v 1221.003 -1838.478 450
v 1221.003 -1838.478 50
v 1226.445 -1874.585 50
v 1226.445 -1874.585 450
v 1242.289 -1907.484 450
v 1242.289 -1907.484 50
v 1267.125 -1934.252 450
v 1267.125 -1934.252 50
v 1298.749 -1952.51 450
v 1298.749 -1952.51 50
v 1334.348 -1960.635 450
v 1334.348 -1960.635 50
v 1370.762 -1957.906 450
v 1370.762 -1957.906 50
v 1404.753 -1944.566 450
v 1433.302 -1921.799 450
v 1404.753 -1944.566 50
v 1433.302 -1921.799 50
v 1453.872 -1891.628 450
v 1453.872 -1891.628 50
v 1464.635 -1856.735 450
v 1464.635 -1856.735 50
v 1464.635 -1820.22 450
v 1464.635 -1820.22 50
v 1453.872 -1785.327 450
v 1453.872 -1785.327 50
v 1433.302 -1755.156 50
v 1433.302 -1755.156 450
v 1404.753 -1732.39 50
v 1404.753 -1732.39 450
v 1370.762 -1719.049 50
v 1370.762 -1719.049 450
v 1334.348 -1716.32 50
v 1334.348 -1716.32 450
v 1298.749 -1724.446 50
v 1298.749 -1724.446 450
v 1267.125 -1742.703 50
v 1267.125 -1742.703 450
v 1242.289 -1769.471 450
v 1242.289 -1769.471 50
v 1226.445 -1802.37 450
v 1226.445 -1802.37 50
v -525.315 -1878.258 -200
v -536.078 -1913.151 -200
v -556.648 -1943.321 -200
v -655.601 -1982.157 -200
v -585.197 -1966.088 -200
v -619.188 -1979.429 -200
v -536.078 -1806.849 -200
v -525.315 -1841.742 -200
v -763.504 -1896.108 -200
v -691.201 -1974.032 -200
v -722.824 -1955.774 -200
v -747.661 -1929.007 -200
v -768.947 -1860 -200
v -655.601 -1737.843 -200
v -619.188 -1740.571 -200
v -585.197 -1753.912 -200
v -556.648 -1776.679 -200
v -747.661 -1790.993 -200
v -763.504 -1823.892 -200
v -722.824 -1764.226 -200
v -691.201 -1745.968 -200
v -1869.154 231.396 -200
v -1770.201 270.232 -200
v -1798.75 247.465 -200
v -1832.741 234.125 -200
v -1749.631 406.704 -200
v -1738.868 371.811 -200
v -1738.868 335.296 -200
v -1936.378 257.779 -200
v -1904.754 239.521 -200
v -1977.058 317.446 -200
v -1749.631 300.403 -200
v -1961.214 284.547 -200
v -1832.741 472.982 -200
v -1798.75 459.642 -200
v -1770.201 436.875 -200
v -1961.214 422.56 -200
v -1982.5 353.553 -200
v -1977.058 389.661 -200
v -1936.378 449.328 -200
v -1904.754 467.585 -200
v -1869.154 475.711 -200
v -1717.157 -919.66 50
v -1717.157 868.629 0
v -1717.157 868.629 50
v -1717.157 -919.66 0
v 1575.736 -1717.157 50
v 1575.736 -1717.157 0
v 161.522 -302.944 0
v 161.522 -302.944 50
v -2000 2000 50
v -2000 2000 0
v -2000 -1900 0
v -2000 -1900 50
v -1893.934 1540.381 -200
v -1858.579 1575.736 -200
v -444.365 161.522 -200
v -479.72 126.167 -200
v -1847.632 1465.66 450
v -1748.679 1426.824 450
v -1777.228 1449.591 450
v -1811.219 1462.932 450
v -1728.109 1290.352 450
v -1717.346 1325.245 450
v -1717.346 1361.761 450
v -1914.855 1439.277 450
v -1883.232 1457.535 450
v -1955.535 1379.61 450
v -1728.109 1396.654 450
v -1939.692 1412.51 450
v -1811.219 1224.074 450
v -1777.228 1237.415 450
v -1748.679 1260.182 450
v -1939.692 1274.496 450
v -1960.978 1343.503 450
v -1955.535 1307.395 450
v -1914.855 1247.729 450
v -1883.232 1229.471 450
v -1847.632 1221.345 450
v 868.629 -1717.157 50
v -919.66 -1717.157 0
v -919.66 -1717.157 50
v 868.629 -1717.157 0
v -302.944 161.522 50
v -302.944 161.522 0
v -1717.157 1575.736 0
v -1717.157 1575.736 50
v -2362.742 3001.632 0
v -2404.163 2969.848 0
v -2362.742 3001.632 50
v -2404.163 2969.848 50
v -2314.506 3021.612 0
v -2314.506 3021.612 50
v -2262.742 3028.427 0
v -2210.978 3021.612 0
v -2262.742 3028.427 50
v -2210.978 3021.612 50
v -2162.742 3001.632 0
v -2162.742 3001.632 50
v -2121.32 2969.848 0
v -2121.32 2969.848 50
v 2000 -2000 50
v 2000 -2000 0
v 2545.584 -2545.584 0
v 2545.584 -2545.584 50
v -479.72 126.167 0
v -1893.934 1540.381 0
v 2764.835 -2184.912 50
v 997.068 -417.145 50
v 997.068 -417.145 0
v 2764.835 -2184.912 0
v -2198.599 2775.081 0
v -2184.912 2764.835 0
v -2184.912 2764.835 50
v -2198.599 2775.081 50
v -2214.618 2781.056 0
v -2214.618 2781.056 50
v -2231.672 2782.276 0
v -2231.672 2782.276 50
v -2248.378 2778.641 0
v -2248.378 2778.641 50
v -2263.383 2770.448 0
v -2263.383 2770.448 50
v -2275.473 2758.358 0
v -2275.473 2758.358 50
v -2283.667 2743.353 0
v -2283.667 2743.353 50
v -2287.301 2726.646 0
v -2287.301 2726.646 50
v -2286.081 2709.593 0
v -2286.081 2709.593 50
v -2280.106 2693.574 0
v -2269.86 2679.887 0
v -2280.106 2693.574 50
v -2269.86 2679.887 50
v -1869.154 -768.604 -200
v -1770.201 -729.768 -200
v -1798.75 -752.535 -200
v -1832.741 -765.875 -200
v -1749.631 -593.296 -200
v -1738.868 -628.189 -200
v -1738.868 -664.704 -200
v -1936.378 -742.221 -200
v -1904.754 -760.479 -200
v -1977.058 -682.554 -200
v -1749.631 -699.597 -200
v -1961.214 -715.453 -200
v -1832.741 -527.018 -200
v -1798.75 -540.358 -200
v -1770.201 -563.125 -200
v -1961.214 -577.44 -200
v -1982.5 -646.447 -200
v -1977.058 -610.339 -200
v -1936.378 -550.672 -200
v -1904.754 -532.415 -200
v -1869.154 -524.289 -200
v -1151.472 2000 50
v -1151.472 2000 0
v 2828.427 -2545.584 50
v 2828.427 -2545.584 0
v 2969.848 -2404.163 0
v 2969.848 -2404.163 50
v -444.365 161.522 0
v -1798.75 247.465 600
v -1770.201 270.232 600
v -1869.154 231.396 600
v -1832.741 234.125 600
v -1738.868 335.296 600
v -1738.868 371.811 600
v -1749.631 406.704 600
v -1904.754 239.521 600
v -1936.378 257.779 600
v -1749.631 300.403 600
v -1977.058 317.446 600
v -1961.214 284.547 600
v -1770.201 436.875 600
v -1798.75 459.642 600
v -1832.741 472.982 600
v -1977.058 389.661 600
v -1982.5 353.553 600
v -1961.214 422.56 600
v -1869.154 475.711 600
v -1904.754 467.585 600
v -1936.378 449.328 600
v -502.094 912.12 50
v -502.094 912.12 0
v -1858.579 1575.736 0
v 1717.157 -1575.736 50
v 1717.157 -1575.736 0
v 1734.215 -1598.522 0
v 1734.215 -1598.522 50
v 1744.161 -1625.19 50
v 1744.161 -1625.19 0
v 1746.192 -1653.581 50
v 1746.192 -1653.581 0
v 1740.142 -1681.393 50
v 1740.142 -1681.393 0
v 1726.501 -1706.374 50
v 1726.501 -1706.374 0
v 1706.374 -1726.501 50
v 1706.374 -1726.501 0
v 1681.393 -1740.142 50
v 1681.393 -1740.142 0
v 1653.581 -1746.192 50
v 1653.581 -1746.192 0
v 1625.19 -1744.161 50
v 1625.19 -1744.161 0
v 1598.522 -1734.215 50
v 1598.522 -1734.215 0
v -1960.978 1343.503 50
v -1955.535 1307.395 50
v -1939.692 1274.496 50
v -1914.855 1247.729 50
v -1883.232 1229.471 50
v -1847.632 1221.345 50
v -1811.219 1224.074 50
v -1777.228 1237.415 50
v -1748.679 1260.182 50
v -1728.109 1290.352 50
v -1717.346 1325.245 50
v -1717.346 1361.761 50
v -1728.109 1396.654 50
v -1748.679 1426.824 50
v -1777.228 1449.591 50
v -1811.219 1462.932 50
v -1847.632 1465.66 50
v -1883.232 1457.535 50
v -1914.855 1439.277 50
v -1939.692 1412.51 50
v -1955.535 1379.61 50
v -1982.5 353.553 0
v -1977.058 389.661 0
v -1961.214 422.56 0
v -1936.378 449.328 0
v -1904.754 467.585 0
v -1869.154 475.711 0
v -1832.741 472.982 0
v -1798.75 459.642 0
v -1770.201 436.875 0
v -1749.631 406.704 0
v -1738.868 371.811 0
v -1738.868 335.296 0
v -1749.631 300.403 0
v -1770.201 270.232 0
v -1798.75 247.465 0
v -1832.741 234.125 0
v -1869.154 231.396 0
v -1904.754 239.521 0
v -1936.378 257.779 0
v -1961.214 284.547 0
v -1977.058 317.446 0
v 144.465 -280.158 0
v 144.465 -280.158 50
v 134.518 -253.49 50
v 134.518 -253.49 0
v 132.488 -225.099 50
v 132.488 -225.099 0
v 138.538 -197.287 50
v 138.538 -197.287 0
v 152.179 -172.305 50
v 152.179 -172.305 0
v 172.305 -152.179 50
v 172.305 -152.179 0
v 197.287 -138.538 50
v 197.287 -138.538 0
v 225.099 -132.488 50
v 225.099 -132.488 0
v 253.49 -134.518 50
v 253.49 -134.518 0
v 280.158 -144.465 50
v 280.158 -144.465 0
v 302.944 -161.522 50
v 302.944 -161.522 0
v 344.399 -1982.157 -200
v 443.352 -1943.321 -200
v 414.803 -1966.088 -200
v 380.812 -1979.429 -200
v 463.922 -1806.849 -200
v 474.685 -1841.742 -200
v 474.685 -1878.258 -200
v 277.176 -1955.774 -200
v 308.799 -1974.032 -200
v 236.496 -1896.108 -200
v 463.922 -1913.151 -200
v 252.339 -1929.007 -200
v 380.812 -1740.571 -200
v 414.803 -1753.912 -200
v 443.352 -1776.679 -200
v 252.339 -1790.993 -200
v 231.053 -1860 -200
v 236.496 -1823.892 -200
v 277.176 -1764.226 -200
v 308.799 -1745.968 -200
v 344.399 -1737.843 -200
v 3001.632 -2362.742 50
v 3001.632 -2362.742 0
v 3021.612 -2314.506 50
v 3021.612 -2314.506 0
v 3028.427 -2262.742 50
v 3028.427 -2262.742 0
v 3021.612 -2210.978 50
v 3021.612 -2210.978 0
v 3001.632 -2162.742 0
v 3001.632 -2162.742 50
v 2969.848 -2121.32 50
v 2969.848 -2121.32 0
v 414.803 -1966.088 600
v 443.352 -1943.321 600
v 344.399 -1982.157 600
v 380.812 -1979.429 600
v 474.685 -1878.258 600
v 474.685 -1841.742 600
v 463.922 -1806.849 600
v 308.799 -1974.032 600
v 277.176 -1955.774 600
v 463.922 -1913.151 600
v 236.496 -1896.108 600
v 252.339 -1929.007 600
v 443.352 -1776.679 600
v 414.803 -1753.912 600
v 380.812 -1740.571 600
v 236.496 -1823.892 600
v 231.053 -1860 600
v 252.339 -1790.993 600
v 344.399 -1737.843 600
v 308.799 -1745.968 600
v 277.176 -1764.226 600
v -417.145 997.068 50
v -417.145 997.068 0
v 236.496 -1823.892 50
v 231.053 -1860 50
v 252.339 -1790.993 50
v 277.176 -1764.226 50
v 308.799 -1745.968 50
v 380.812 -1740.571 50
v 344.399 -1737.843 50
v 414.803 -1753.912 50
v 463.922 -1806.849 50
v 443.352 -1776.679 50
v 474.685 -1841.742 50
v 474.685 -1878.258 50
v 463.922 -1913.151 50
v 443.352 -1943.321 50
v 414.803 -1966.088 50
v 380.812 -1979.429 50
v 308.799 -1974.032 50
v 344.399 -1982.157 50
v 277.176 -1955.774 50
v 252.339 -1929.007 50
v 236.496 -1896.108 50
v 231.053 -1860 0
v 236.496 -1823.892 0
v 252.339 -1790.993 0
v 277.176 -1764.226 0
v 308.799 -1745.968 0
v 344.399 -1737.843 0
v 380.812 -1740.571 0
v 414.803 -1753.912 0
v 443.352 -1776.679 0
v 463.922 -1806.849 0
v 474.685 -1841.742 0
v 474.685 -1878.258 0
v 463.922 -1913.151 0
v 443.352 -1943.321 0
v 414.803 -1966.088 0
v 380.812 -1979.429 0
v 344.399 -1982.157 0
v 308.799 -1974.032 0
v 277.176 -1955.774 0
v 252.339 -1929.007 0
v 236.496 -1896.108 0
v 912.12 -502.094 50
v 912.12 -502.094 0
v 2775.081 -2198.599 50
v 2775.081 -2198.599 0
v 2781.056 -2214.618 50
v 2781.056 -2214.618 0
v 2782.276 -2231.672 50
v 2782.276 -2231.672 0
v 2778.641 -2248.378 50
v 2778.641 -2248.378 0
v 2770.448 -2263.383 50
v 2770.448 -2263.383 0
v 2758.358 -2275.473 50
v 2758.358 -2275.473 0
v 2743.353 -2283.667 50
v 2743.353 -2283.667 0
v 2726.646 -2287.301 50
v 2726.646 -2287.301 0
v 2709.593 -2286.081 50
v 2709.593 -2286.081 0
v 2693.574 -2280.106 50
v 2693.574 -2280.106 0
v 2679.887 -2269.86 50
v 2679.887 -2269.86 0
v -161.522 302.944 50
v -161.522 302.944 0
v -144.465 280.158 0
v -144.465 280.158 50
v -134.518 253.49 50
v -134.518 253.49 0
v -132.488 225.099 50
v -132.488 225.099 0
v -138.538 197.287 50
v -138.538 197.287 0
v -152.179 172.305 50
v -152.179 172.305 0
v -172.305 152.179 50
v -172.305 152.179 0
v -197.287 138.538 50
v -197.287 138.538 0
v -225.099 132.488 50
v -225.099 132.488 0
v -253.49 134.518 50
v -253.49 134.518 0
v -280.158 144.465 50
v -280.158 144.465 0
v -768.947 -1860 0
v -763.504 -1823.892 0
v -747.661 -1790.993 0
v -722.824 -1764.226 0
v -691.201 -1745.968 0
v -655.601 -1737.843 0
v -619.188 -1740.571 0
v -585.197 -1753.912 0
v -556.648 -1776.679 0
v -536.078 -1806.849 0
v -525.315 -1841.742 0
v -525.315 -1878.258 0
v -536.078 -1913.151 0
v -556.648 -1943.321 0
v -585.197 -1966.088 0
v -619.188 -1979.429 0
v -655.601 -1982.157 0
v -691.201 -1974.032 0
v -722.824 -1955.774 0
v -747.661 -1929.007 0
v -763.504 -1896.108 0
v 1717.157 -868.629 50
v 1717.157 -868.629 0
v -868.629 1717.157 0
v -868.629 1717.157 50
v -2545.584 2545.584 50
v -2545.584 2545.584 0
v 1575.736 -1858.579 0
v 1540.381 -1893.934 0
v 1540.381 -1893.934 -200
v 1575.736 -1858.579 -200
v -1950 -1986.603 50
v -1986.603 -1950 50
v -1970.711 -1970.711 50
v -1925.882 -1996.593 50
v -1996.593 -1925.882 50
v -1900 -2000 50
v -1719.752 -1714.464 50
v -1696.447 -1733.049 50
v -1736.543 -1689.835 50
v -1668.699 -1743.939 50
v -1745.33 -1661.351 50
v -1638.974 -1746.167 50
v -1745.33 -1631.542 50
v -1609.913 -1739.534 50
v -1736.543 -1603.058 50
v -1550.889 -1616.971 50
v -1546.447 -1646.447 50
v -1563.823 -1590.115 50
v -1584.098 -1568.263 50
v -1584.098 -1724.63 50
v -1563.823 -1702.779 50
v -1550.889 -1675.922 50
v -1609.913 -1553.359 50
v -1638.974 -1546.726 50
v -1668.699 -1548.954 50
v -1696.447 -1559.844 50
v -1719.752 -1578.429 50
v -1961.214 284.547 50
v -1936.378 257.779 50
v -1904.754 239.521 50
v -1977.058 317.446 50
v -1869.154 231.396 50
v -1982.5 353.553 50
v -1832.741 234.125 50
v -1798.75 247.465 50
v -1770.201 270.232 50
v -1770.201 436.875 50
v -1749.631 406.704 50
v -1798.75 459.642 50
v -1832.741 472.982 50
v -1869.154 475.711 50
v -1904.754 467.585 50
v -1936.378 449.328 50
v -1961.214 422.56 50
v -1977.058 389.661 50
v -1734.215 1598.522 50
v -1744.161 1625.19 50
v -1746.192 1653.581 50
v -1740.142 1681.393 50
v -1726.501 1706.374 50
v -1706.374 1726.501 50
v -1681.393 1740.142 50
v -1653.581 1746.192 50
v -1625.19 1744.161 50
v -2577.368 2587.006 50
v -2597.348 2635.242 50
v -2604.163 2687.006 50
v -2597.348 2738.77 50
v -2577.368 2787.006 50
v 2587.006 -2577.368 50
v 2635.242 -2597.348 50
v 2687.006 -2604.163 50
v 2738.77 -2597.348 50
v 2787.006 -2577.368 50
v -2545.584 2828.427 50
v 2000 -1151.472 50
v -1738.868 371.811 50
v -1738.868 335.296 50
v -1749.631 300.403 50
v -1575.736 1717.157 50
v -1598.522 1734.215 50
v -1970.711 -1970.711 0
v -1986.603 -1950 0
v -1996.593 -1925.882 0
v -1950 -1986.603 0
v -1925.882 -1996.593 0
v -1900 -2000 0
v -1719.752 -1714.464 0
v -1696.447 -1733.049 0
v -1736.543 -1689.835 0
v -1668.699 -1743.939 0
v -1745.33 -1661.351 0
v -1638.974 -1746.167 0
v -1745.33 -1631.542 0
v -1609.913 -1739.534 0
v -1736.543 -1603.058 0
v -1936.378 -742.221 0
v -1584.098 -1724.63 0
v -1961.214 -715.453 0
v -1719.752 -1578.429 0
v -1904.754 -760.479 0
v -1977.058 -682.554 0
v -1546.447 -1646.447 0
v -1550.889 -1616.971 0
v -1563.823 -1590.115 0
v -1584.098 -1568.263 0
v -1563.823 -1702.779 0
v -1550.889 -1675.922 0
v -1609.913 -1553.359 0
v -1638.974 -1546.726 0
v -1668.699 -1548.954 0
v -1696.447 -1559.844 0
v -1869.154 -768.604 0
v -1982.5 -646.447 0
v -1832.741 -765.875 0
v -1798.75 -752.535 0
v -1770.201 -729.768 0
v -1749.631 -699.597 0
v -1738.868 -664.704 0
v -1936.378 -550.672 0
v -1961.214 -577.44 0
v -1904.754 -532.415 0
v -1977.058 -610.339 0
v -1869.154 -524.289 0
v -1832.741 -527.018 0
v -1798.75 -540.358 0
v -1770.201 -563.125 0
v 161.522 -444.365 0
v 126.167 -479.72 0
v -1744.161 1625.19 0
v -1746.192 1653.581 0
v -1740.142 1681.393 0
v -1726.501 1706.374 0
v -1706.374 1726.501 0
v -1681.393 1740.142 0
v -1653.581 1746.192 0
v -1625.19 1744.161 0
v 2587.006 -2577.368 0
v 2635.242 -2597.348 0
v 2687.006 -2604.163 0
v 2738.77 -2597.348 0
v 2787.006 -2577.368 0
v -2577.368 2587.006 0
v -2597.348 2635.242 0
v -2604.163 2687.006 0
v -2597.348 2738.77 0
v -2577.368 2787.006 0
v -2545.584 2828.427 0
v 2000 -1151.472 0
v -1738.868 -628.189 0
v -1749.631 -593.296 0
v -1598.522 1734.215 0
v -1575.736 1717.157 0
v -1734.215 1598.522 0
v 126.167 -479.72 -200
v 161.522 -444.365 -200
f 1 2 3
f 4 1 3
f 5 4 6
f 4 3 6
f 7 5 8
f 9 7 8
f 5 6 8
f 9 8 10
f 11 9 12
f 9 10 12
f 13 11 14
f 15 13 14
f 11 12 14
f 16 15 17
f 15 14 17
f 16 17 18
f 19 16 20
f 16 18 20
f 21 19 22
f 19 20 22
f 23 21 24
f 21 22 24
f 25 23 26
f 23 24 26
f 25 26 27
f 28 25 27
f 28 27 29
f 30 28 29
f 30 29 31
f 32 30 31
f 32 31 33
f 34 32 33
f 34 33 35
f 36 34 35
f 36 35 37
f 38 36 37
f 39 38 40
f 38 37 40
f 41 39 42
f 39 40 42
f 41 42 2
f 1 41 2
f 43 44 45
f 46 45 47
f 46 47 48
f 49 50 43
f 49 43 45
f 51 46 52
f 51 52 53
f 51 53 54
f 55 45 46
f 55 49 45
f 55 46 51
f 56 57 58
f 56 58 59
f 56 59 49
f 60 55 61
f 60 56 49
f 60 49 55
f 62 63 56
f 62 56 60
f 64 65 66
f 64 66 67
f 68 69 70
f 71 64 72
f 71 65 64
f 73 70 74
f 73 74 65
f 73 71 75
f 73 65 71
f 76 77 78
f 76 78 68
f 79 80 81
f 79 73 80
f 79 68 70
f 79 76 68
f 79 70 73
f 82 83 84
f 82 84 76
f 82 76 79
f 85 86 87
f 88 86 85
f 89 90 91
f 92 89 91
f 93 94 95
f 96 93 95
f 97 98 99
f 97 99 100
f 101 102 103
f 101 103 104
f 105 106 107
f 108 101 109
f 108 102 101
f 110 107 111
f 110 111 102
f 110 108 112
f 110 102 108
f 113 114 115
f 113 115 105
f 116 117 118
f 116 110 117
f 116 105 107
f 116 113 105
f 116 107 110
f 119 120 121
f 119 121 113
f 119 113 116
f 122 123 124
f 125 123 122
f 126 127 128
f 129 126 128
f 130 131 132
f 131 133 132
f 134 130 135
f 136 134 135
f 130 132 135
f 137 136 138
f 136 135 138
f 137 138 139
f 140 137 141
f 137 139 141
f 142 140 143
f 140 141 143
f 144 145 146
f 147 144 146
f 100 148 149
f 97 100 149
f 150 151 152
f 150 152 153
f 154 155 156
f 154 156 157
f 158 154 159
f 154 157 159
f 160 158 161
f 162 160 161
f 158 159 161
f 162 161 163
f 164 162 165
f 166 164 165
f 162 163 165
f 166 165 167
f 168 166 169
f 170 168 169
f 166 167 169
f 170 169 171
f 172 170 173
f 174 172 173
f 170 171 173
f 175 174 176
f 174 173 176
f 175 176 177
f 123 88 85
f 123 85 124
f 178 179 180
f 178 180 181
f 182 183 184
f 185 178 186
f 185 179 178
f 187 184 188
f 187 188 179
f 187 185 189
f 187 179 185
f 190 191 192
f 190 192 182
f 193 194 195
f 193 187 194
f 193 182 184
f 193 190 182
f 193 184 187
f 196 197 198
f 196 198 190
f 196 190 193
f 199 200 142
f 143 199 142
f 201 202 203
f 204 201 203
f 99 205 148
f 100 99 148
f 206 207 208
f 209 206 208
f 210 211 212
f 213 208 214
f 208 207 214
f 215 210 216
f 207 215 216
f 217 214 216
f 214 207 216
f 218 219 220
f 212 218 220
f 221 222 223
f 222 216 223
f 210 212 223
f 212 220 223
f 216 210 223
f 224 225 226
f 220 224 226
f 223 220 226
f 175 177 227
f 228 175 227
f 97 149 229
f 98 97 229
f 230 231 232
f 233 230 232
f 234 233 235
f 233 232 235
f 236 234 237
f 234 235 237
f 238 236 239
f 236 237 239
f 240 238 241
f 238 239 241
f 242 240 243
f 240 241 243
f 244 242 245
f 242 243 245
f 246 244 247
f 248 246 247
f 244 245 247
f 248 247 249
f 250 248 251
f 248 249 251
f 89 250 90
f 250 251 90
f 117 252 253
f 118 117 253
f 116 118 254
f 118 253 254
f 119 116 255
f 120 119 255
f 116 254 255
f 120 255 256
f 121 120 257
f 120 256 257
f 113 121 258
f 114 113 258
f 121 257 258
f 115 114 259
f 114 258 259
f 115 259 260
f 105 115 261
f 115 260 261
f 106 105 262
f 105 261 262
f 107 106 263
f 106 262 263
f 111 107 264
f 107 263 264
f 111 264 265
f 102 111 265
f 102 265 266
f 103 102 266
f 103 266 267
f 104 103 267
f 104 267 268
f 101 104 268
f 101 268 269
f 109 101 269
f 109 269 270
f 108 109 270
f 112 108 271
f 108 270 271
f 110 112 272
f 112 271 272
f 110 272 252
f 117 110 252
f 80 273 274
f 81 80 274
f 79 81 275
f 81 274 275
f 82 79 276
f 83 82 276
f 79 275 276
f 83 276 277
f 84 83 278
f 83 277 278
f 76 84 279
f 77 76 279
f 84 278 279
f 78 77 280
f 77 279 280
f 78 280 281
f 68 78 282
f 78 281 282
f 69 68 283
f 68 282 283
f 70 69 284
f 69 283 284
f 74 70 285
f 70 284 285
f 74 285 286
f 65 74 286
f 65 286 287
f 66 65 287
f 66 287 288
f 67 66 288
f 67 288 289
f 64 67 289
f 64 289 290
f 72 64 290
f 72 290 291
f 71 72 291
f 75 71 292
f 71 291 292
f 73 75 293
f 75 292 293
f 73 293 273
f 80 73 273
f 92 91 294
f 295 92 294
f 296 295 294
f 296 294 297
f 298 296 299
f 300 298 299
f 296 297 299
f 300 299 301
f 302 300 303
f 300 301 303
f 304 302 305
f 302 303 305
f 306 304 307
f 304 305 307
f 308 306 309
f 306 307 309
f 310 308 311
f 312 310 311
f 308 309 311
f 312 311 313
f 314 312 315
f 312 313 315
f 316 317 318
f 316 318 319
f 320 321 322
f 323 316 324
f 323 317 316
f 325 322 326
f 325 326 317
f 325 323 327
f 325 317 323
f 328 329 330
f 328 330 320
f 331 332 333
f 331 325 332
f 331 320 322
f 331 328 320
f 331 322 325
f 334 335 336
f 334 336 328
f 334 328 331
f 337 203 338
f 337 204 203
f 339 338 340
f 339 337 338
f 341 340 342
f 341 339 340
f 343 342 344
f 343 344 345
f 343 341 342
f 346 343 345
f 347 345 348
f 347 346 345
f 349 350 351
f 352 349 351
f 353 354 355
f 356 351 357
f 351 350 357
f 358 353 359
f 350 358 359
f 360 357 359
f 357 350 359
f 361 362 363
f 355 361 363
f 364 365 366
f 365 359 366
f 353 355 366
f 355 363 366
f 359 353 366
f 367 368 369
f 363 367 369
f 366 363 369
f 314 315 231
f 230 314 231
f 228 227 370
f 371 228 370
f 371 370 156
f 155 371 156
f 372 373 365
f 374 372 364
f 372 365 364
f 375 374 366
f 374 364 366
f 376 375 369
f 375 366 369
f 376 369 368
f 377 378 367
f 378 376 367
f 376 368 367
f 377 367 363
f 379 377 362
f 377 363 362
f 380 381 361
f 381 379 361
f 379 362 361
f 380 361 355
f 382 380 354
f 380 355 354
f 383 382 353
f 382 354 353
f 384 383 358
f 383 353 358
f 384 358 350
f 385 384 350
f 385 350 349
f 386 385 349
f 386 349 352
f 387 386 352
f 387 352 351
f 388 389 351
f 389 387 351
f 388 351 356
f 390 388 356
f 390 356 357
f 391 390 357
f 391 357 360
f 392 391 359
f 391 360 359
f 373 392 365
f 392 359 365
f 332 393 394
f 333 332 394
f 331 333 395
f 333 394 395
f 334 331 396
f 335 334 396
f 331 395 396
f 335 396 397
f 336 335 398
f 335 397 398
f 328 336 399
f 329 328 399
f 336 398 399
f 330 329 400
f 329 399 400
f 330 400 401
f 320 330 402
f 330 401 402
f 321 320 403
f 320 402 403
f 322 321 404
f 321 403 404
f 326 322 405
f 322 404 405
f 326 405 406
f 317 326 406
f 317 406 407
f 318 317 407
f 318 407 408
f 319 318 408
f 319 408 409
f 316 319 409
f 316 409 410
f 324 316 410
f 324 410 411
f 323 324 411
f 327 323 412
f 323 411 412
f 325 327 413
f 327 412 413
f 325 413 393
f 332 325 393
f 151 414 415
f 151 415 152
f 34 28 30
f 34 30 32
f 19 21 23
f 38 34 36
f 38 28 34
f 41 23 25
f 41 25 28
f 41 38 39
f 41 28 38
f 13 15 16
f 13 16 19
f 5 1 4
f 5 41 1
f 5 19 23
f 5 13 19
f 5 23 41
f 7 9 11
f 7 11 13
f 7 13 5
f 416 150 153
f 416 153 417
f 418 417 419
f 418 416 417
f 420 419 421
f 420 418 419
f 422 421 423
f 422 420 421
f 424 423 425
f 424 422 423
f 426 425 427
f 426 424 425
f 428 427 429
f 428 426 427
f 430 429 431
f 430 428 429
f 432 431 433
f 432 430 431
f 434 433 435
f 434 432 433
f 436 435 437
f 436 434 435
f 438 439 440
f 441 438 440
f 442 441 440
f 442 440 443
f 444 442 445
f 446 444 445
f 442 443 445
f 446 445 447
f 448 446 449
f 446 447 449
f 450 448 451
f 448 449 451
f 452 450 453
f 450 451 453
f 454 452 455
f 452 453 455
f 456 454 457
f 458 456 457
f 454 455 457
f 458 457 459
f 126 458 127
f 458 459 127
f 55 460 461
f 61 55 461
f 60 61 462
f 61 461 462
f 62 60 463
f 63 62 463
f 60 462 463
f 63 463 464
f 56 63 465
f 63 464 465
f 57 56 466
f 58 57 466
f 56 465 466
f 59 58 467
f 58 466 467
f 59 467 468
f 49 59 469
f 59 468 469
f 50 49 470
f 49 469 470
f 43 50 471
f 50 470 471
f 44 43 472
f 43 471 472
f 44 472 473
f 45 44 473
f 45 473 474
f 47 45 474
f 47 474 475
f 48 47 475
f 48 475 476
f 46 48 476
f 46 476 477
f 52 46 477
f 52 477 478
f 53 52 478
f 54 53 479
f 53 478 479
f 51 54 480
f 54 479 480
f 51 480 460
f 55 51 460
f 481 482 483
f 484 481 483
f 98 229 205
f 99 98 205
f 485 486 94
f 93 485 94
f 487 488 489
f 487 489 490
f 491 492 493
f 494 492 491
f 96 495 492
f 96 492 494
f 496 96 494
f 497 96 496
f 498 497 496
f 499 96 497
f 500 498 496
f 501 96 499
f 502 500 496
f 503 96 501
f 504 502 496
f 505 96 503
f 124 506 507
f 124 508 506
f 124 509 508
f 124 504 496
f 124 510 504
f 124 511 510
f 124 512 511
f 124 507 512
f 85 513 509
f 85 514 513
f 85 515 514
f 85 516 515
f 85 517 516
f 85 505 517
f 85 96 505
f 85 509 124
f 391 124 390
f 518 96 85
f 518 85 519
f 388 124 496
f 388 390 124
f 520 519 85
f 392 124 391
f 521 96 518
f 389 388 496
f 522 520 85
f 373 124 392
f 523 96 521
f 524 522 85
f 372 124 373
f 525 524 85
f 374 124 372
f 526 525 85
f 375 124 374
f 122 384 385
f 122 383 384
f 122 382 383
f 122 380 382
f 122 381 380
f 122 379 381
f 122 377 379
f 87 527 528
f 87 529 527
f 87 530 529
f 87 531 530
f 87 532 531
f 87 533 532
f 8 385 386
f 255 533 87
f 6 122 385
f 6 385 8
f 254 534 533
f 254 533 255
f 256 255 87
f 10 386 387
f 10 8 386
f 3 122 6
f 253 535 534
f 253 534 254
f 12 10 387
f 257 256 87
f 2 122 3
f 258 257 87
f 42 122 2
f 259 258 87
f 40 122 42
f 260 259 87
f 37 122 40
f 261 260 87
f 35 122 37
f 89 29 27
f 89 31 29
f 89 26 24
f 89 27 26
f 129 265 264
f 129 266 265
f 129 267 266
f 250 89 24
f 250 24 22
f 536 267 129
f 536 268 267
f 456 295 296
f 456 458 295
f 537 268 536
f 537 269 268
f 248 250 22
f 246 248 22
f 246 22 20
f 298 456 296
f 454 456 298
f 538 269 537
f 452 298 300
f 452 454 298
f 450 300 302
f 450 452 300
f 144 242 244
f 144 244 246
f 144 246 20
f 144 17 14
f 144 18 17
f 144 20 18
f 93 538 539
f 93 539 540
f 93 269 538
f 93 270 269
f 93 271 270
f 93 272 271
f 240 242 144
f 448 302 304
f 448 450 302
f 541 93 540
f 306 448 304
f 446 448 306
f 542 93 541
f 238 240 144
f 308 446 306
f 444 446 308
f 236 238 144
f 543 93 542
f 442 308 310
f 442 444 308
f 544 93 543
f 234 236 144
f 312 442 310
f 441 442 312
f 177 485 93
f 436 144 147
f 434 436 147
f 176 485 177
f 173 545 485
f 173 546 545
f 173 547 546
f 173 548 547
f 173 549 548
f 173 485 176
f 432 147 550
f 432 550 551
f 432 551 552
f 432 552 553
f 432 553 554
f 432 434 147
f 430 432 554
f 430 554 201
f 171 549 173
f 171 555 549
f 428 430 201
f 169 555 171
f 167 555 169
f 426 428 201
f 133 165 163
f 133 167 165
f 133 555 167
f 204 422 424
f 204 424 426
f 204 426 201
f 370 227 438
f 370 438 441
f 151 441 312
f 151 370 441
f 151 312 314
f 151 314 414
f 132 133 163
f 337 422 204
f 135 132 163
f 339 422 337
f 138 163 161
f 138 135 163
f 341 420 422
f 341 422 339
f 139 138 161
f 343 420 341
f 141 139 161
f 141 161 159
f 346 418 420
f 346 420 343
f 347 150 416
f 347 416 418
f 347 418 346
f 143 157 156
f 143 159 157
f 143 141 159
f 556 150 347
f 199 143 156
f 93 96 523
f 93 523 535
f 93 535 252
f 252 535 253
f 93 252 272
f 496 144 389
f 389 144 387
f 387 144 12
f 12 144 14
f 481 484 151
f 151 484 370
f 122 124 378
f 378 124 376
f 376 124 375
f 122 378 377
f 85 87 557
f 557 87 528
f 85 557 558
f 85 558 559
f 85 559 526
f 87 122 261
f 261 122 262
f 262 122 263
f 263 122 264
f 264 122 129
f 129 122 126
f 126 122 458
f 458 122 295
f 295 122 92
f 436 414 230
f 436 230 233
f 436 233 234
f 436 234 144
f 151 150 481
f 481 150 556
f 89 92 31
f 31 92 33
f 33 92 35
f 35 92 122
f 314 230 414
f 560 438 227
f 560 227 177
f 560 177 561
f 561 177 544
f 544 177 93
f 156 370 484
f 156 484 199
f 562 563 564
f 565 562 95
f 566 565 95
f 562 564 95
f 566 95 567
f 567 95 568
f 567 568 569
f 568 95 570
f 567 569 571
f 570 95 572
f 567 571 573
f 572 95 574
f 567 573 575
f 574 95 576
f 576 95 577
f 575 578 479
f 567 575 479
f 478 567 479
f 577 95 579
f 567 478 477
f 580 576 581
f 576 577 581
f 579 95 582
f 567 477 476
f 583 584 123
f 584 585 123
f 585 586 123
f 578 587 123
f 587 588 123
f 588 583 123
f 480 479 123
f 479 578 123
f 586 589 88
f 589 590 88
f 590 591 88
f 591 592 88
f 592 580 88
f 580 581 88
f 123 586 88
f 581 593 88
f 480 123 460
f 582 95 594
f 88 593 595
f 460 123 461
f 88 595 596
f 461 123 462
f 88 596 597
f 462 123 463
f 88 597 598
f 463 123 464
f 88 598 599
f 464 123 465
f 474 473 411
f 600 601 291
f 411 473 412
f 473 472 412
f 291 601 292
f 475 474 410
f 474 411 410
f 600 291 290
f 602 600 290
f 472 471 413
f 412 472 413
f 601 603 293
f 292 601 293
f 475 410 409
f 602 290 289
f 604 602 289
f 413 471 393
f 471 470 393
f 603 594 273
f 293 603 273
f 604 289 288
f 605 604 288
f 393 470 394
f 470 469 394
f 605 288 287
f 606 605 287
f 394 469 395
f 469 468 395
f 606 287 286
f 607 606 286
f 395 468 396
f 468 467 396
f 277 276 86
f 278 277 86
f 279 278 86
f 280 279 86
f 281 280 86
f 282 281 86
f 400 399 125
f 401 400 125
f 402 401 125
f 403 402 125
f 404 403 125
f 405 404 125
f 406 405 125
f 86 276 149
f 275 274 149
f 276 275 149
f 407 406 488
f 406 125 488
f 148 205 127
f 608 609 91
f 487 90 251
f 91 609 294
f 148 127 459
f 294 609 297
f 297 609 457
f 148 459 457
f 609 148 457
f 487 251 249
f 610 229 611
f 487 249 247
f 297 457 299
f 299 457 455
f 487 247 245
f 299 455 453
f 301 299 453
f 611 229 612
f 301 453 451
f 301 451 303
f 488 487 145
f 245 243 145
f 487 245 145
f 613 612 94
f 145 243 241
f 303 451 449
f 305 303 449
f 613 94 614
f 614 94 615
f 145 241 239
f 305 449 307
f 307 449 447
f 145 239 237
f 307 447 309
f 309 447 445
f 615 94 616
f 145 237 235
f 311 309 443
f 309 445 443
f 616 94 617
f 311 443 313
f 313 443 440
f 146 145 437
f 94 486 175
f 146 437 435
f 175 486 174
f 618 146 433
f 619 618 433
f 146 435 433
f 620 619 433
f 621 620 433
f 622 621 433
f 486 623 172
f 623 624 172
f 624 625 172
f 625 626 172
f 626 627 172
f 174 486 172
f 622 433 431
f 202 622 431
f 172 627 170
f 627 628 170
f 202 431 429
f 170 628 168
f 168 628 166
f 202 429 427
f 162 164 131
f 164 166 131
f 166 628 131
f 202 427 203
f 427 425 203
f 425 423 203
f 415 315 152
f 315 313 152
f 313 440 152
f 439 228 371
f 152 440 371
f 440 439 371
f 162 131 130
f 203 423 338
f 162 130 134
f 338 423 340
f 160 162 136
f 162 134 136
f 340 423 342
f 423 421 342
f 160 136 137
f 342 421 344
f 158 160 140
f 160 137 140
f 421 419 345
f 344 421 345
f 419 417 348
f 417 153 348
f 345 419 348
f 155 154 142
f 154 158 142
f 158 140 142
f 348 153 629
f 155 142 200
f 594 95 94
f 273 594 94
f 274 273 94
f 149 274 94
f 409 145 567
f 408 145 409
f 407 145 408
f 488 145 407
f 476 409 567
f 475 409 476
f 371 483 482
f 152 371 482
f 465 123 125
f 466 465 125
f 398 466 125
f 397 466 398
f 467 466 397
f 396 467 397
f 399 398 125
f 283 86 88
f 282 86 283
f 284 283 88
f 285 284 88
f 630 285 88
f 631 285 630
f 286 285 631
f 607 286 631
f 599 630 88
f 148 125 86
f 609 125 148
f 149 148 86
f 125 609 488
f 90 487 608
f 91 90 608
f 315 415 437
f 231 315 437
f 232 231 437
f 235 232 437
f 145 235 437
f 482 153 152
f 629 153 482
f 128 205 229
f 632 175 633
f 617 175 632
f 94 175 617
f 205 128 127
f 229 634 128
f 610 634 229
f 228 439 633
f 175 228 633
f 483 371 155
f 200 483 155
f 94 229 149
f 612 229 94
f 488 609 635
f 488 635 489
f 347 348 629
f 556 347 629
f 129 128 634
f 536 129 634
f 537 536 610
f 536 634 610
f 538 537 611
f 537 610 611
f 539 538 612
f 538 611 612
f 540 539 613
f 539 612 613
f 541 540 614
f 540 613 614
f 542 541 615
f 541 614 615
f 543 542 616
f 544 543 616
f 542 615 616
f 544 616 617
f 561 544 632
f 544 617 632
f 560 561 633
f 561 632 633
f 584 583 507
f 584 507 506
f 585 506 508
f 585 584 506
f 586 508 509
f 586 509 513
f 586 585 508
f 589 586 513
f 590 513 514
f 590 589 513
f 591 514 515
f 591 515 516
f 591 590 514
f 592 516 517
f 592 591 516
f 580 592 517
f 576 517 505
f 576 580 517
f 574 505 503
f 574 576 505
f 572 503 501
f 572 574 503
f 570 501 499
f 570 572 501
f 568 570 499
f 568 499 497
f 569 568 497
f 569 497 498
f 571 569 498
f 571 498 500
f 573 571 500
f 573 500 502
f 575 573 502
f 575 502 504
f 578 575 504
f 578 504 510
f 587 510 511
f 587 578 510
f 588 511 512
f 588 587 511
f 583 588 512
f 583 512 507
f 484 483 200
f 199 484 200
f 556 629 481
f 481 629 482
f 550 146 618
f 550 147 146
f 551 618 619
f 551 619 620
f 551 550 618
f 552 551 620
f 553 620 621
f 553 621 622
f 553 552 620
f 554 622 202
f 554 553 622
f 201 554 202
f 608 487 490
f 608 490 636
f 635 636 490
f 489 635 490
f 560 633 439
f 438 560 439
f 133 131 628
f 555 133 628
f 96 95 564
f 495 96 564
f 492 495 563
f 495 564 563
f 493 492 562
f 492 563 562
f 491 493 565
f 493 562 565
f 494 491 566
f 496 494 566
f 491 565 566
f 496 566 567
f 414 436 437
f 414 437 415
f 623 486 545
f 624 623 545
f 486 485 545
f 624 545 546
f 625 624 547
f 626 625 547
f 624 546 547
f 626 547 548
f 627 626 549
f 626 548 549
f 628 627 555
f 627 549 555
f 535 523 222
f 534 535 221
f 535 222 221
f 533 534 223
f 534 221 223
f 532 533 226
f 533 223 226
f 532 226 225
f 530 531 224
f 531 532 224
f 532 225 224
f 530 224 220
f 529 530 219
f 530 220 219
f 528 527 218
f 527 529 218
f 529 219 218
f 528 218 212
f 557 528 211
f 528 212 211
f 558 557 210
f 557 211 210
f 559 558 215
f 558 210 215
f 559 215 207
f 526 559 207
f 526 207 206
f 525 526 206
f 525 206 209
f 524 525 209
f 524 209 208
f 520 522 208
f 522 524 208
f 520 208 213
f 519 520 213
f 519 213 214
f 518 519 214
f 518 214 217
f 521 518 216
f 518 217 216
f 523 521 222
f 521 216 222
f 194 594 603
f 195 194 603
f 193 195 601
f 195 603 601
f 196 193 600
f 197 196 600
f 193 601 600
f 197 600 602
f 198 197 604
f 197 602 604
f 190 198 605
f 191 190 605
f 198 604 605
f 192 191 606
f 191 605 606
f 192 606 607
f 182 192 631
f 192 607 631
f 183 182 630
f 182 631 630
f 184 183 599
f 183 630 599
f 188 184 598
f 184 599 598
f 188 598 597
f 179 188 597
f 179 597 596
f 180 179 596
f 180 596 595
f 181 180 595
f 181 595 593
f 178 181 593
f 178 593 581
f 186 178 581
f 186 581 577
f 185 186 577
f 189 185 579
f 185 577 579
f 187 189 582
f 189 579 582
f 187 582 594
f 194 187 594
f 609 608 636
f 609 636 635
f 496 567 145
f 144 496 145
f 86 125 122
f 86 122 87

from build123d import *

# Parameters (mm, degrees)
SKETCH1_R           = 100
BOSS_EXTRUDE1_DEPTH = 50
SKETCH3_R           = 122.5
BOSS_EXTRUDE3_DEPTH = 200
BOSS_EXTRUDE4_START = -600
SKETCH3_2_R         = 122.5
BOSS_EXTRUDE4_DEPTH = 600
SKETCH6_R           = 122.5
BOSS_EXTRUDE5_DEPTH = 400
CUT_EXTRUDE1_DEPTH  = 4435.241761564
FILLET1_R           = 200


with BuildPart() as part:
    # Sketch1 → Boss-Extrude1 (new body)
    with BuildSketch(Plane.XY):
        with BuildLine():
            Line((-2000, 2000), (-2000, -1900))
            ThreePointArc((-2000, -1900), (-1970.710678119, -1970.710678119), (-1900, -2000))
            Line((-1900, -2000), (2000, -2000))
            Line((2000, -2000), (2687.005768509, -2687.005768509))
            Line((2687.005768509, -2687.005768509), (3111.269837221, -2262.741699797))
            Line((3111.269837221, -2262.741699797), (2000, -1151.471862576))
            Line((2000, -1151.471862576), (1717.157287525, -868.629150102))
            Line((1717.157287525, -868.629150102), (-868.629150102, 1717.157287525))
            Line((-868.629150102, 1717.157287525), (-1151.471862576, 2000))
            Line((-1151.471862576, 2000), (-2262.741699797, 3111.269837221))
            Line((-2262.741699797, 3111.269837221), (-2687.005768509, 2687.005768509))
            Line((-2687.005768509, 2687.005768509), (-2000, 2000))
        make_face()
        with Locations((-1646.446609407, -1646.446609407)):
            Circle(SKETCH1_R, mode=Mode.SUBTRACT)
        with BuildLine():
            Line((1575.735931288, -1717.157287525), (161.522368915, -302.943725152))
            ThreePointArc((161.522368915, -302.943725152), (161.522368915, -161.522368915), (302.943725152, -161.522368915))
            Line((302.943725152, -161.522368915), (1717.157287525, -1575.735931288))
            ThreePointArc((1717.157287525, -1575.735931288), (1717.157287525, -1717.157287525), (1575.735931288, -1717.157287525))
        make_face(mode=Mode.SUBTRACT)
        with BuildLine():
            Line((-302.943725152, 161.522368915), (-1717.157287525, 1575.735931288))
            ThreePointArc((-1717.157287525, 1575.735931288), (-1717.157287525, 1717.157287525), (-1575.735931288, 1717.157287525))
            Line((-1575.735931288, 1717.157287525), (-161.522368915, 302.943725152))
            ThreePointArc((-161.522368915, 302.943725152), (-161.522368915, 161.522368915), (-302.943725152, 161.522368915))
        make_face(mode=Mode.SUBTRACT)
        Polygon((-919.659730978, -1717.157287525), (868.629150102, -1717.157287525), (-1717.157287525, 868.629150102), (-1717.157287525, -919.659730978), align=None, mode=Mode.SUBTRACT)
    extrude(amount=BOSS_EXTRUDE1_DEPTH)

    # Sketch3 → Boss-Extrude3 (add)
    with BuildSketch(Plane(origin=(0, 0, 0), x_dir=(-1, 0, 0), z_dir=(0, 0, -1))):
        with Locations((646.446609407, -1860)):
            Circle(SKETCH3_R)
        with Locations((-353.553390593, -1860)):
            Circle(SKETCH3_R)
        with Locations((1860, -646.446609407)):
            Circle(SKETCH3_R)
        with Locations((1860, 353.553390593)):
            Circle(SKETCH3_R)
        Polygon((1858.578643763, 1575.735931288), (444.36508139, 161.522368915), (479.720420449, 126.167029856), (1893.933982822, 1540.380592229), align=None)
        Polygon((-1540.380592229, -1893.933982822), (-1575.735931288, -1858.578643763), (-161.522368915, -444.36508139), (-126.167029856, -479.720420449), align=None)
    extrude(amount=BOSS_EXTRUDE3_DEPTH)

    # Sketch3<2> → Boss-Extrude4 (add)
    with BuildSketch(Plane(origin=(0, 0, 0), x_dir=(-1, 0, 0), z_dir=(0, 0, -1)).offset(BOSS_EXTRUDE4_START)):
        with Locations((-353.553390593, -1860)):
            Circle(SKETCH3_2_R)
        with Locations((1860, 353.553390593)):
            Circle(SKETCH3_2_R)
    extrude(amount=BOSS_EXTRUDE4_DEPTH)

    # Sketch6 → Boss-Extrude5 (add)
    with BuildSketch(Plane.XY.offset(50)):
        with Locations((-1838.477631085, 1343.502884254)):
            Circle(SKETCH6_R)
        with Locations((1343.502884254, -1838.477631085)):
            Circle(SKETCH6_R)
    extrude(amount=BOSS_EXTRUDE5_DEPTH)

    # Sketch8 → Cut-Extrude1 (cut, through all)
    with BuildSketch(Plane.XY.offset(50)):
        with BuildLine():
            Line((-2269.860497369, 2679.886970937), (-502.093544403, 912.12001797))
            Line((-502.093544403, 912.12001797), (-417.14527114, 997.068291233))
            Line((-417.14527114, 997.068291233), (-2184.912224106, 2764.8352442))
            ThreePointArc((-2184.912224106, 2764.8352442), (-2269.860497369, 2764.8352442), (-2269.860497369, 2679.886970937))
        make_face()
        with BuildLine():
            Line((912.12001797, -502.093544403), (997.068291233, -417.14527114))
            Line((997.068291233, -417.14527114), (2764.8352442, -2184.912224106))
            ThreePointArc((2764.8352442, -2184.912224106), (2764.8352442, -2269.860497369), (2679.886970937, -2269.860497369))
            Line((2679.886970937, -2269.860497369), (912.12001797, -502.093544403))
        make_face()
    extrude(amount=-CUT_EXTRUDE1_DEPTH, mode=Mode.SUBTRACT)

    # Fillet1
    fillet1_edges = [part.edges().sort_by_distance(p)[0] for p in [
        (-2687.005768509, 2687.005768509, 25),
        (-2262.741699797, 3111.269837221, 25),
        (3111.269837221, -2262.741699797, 25),
        (2687.005768509, -2687.005768509, 25),
    ]]
    fillet(fillet1_edges, radius=FILLET1_R)


solid = part.part
